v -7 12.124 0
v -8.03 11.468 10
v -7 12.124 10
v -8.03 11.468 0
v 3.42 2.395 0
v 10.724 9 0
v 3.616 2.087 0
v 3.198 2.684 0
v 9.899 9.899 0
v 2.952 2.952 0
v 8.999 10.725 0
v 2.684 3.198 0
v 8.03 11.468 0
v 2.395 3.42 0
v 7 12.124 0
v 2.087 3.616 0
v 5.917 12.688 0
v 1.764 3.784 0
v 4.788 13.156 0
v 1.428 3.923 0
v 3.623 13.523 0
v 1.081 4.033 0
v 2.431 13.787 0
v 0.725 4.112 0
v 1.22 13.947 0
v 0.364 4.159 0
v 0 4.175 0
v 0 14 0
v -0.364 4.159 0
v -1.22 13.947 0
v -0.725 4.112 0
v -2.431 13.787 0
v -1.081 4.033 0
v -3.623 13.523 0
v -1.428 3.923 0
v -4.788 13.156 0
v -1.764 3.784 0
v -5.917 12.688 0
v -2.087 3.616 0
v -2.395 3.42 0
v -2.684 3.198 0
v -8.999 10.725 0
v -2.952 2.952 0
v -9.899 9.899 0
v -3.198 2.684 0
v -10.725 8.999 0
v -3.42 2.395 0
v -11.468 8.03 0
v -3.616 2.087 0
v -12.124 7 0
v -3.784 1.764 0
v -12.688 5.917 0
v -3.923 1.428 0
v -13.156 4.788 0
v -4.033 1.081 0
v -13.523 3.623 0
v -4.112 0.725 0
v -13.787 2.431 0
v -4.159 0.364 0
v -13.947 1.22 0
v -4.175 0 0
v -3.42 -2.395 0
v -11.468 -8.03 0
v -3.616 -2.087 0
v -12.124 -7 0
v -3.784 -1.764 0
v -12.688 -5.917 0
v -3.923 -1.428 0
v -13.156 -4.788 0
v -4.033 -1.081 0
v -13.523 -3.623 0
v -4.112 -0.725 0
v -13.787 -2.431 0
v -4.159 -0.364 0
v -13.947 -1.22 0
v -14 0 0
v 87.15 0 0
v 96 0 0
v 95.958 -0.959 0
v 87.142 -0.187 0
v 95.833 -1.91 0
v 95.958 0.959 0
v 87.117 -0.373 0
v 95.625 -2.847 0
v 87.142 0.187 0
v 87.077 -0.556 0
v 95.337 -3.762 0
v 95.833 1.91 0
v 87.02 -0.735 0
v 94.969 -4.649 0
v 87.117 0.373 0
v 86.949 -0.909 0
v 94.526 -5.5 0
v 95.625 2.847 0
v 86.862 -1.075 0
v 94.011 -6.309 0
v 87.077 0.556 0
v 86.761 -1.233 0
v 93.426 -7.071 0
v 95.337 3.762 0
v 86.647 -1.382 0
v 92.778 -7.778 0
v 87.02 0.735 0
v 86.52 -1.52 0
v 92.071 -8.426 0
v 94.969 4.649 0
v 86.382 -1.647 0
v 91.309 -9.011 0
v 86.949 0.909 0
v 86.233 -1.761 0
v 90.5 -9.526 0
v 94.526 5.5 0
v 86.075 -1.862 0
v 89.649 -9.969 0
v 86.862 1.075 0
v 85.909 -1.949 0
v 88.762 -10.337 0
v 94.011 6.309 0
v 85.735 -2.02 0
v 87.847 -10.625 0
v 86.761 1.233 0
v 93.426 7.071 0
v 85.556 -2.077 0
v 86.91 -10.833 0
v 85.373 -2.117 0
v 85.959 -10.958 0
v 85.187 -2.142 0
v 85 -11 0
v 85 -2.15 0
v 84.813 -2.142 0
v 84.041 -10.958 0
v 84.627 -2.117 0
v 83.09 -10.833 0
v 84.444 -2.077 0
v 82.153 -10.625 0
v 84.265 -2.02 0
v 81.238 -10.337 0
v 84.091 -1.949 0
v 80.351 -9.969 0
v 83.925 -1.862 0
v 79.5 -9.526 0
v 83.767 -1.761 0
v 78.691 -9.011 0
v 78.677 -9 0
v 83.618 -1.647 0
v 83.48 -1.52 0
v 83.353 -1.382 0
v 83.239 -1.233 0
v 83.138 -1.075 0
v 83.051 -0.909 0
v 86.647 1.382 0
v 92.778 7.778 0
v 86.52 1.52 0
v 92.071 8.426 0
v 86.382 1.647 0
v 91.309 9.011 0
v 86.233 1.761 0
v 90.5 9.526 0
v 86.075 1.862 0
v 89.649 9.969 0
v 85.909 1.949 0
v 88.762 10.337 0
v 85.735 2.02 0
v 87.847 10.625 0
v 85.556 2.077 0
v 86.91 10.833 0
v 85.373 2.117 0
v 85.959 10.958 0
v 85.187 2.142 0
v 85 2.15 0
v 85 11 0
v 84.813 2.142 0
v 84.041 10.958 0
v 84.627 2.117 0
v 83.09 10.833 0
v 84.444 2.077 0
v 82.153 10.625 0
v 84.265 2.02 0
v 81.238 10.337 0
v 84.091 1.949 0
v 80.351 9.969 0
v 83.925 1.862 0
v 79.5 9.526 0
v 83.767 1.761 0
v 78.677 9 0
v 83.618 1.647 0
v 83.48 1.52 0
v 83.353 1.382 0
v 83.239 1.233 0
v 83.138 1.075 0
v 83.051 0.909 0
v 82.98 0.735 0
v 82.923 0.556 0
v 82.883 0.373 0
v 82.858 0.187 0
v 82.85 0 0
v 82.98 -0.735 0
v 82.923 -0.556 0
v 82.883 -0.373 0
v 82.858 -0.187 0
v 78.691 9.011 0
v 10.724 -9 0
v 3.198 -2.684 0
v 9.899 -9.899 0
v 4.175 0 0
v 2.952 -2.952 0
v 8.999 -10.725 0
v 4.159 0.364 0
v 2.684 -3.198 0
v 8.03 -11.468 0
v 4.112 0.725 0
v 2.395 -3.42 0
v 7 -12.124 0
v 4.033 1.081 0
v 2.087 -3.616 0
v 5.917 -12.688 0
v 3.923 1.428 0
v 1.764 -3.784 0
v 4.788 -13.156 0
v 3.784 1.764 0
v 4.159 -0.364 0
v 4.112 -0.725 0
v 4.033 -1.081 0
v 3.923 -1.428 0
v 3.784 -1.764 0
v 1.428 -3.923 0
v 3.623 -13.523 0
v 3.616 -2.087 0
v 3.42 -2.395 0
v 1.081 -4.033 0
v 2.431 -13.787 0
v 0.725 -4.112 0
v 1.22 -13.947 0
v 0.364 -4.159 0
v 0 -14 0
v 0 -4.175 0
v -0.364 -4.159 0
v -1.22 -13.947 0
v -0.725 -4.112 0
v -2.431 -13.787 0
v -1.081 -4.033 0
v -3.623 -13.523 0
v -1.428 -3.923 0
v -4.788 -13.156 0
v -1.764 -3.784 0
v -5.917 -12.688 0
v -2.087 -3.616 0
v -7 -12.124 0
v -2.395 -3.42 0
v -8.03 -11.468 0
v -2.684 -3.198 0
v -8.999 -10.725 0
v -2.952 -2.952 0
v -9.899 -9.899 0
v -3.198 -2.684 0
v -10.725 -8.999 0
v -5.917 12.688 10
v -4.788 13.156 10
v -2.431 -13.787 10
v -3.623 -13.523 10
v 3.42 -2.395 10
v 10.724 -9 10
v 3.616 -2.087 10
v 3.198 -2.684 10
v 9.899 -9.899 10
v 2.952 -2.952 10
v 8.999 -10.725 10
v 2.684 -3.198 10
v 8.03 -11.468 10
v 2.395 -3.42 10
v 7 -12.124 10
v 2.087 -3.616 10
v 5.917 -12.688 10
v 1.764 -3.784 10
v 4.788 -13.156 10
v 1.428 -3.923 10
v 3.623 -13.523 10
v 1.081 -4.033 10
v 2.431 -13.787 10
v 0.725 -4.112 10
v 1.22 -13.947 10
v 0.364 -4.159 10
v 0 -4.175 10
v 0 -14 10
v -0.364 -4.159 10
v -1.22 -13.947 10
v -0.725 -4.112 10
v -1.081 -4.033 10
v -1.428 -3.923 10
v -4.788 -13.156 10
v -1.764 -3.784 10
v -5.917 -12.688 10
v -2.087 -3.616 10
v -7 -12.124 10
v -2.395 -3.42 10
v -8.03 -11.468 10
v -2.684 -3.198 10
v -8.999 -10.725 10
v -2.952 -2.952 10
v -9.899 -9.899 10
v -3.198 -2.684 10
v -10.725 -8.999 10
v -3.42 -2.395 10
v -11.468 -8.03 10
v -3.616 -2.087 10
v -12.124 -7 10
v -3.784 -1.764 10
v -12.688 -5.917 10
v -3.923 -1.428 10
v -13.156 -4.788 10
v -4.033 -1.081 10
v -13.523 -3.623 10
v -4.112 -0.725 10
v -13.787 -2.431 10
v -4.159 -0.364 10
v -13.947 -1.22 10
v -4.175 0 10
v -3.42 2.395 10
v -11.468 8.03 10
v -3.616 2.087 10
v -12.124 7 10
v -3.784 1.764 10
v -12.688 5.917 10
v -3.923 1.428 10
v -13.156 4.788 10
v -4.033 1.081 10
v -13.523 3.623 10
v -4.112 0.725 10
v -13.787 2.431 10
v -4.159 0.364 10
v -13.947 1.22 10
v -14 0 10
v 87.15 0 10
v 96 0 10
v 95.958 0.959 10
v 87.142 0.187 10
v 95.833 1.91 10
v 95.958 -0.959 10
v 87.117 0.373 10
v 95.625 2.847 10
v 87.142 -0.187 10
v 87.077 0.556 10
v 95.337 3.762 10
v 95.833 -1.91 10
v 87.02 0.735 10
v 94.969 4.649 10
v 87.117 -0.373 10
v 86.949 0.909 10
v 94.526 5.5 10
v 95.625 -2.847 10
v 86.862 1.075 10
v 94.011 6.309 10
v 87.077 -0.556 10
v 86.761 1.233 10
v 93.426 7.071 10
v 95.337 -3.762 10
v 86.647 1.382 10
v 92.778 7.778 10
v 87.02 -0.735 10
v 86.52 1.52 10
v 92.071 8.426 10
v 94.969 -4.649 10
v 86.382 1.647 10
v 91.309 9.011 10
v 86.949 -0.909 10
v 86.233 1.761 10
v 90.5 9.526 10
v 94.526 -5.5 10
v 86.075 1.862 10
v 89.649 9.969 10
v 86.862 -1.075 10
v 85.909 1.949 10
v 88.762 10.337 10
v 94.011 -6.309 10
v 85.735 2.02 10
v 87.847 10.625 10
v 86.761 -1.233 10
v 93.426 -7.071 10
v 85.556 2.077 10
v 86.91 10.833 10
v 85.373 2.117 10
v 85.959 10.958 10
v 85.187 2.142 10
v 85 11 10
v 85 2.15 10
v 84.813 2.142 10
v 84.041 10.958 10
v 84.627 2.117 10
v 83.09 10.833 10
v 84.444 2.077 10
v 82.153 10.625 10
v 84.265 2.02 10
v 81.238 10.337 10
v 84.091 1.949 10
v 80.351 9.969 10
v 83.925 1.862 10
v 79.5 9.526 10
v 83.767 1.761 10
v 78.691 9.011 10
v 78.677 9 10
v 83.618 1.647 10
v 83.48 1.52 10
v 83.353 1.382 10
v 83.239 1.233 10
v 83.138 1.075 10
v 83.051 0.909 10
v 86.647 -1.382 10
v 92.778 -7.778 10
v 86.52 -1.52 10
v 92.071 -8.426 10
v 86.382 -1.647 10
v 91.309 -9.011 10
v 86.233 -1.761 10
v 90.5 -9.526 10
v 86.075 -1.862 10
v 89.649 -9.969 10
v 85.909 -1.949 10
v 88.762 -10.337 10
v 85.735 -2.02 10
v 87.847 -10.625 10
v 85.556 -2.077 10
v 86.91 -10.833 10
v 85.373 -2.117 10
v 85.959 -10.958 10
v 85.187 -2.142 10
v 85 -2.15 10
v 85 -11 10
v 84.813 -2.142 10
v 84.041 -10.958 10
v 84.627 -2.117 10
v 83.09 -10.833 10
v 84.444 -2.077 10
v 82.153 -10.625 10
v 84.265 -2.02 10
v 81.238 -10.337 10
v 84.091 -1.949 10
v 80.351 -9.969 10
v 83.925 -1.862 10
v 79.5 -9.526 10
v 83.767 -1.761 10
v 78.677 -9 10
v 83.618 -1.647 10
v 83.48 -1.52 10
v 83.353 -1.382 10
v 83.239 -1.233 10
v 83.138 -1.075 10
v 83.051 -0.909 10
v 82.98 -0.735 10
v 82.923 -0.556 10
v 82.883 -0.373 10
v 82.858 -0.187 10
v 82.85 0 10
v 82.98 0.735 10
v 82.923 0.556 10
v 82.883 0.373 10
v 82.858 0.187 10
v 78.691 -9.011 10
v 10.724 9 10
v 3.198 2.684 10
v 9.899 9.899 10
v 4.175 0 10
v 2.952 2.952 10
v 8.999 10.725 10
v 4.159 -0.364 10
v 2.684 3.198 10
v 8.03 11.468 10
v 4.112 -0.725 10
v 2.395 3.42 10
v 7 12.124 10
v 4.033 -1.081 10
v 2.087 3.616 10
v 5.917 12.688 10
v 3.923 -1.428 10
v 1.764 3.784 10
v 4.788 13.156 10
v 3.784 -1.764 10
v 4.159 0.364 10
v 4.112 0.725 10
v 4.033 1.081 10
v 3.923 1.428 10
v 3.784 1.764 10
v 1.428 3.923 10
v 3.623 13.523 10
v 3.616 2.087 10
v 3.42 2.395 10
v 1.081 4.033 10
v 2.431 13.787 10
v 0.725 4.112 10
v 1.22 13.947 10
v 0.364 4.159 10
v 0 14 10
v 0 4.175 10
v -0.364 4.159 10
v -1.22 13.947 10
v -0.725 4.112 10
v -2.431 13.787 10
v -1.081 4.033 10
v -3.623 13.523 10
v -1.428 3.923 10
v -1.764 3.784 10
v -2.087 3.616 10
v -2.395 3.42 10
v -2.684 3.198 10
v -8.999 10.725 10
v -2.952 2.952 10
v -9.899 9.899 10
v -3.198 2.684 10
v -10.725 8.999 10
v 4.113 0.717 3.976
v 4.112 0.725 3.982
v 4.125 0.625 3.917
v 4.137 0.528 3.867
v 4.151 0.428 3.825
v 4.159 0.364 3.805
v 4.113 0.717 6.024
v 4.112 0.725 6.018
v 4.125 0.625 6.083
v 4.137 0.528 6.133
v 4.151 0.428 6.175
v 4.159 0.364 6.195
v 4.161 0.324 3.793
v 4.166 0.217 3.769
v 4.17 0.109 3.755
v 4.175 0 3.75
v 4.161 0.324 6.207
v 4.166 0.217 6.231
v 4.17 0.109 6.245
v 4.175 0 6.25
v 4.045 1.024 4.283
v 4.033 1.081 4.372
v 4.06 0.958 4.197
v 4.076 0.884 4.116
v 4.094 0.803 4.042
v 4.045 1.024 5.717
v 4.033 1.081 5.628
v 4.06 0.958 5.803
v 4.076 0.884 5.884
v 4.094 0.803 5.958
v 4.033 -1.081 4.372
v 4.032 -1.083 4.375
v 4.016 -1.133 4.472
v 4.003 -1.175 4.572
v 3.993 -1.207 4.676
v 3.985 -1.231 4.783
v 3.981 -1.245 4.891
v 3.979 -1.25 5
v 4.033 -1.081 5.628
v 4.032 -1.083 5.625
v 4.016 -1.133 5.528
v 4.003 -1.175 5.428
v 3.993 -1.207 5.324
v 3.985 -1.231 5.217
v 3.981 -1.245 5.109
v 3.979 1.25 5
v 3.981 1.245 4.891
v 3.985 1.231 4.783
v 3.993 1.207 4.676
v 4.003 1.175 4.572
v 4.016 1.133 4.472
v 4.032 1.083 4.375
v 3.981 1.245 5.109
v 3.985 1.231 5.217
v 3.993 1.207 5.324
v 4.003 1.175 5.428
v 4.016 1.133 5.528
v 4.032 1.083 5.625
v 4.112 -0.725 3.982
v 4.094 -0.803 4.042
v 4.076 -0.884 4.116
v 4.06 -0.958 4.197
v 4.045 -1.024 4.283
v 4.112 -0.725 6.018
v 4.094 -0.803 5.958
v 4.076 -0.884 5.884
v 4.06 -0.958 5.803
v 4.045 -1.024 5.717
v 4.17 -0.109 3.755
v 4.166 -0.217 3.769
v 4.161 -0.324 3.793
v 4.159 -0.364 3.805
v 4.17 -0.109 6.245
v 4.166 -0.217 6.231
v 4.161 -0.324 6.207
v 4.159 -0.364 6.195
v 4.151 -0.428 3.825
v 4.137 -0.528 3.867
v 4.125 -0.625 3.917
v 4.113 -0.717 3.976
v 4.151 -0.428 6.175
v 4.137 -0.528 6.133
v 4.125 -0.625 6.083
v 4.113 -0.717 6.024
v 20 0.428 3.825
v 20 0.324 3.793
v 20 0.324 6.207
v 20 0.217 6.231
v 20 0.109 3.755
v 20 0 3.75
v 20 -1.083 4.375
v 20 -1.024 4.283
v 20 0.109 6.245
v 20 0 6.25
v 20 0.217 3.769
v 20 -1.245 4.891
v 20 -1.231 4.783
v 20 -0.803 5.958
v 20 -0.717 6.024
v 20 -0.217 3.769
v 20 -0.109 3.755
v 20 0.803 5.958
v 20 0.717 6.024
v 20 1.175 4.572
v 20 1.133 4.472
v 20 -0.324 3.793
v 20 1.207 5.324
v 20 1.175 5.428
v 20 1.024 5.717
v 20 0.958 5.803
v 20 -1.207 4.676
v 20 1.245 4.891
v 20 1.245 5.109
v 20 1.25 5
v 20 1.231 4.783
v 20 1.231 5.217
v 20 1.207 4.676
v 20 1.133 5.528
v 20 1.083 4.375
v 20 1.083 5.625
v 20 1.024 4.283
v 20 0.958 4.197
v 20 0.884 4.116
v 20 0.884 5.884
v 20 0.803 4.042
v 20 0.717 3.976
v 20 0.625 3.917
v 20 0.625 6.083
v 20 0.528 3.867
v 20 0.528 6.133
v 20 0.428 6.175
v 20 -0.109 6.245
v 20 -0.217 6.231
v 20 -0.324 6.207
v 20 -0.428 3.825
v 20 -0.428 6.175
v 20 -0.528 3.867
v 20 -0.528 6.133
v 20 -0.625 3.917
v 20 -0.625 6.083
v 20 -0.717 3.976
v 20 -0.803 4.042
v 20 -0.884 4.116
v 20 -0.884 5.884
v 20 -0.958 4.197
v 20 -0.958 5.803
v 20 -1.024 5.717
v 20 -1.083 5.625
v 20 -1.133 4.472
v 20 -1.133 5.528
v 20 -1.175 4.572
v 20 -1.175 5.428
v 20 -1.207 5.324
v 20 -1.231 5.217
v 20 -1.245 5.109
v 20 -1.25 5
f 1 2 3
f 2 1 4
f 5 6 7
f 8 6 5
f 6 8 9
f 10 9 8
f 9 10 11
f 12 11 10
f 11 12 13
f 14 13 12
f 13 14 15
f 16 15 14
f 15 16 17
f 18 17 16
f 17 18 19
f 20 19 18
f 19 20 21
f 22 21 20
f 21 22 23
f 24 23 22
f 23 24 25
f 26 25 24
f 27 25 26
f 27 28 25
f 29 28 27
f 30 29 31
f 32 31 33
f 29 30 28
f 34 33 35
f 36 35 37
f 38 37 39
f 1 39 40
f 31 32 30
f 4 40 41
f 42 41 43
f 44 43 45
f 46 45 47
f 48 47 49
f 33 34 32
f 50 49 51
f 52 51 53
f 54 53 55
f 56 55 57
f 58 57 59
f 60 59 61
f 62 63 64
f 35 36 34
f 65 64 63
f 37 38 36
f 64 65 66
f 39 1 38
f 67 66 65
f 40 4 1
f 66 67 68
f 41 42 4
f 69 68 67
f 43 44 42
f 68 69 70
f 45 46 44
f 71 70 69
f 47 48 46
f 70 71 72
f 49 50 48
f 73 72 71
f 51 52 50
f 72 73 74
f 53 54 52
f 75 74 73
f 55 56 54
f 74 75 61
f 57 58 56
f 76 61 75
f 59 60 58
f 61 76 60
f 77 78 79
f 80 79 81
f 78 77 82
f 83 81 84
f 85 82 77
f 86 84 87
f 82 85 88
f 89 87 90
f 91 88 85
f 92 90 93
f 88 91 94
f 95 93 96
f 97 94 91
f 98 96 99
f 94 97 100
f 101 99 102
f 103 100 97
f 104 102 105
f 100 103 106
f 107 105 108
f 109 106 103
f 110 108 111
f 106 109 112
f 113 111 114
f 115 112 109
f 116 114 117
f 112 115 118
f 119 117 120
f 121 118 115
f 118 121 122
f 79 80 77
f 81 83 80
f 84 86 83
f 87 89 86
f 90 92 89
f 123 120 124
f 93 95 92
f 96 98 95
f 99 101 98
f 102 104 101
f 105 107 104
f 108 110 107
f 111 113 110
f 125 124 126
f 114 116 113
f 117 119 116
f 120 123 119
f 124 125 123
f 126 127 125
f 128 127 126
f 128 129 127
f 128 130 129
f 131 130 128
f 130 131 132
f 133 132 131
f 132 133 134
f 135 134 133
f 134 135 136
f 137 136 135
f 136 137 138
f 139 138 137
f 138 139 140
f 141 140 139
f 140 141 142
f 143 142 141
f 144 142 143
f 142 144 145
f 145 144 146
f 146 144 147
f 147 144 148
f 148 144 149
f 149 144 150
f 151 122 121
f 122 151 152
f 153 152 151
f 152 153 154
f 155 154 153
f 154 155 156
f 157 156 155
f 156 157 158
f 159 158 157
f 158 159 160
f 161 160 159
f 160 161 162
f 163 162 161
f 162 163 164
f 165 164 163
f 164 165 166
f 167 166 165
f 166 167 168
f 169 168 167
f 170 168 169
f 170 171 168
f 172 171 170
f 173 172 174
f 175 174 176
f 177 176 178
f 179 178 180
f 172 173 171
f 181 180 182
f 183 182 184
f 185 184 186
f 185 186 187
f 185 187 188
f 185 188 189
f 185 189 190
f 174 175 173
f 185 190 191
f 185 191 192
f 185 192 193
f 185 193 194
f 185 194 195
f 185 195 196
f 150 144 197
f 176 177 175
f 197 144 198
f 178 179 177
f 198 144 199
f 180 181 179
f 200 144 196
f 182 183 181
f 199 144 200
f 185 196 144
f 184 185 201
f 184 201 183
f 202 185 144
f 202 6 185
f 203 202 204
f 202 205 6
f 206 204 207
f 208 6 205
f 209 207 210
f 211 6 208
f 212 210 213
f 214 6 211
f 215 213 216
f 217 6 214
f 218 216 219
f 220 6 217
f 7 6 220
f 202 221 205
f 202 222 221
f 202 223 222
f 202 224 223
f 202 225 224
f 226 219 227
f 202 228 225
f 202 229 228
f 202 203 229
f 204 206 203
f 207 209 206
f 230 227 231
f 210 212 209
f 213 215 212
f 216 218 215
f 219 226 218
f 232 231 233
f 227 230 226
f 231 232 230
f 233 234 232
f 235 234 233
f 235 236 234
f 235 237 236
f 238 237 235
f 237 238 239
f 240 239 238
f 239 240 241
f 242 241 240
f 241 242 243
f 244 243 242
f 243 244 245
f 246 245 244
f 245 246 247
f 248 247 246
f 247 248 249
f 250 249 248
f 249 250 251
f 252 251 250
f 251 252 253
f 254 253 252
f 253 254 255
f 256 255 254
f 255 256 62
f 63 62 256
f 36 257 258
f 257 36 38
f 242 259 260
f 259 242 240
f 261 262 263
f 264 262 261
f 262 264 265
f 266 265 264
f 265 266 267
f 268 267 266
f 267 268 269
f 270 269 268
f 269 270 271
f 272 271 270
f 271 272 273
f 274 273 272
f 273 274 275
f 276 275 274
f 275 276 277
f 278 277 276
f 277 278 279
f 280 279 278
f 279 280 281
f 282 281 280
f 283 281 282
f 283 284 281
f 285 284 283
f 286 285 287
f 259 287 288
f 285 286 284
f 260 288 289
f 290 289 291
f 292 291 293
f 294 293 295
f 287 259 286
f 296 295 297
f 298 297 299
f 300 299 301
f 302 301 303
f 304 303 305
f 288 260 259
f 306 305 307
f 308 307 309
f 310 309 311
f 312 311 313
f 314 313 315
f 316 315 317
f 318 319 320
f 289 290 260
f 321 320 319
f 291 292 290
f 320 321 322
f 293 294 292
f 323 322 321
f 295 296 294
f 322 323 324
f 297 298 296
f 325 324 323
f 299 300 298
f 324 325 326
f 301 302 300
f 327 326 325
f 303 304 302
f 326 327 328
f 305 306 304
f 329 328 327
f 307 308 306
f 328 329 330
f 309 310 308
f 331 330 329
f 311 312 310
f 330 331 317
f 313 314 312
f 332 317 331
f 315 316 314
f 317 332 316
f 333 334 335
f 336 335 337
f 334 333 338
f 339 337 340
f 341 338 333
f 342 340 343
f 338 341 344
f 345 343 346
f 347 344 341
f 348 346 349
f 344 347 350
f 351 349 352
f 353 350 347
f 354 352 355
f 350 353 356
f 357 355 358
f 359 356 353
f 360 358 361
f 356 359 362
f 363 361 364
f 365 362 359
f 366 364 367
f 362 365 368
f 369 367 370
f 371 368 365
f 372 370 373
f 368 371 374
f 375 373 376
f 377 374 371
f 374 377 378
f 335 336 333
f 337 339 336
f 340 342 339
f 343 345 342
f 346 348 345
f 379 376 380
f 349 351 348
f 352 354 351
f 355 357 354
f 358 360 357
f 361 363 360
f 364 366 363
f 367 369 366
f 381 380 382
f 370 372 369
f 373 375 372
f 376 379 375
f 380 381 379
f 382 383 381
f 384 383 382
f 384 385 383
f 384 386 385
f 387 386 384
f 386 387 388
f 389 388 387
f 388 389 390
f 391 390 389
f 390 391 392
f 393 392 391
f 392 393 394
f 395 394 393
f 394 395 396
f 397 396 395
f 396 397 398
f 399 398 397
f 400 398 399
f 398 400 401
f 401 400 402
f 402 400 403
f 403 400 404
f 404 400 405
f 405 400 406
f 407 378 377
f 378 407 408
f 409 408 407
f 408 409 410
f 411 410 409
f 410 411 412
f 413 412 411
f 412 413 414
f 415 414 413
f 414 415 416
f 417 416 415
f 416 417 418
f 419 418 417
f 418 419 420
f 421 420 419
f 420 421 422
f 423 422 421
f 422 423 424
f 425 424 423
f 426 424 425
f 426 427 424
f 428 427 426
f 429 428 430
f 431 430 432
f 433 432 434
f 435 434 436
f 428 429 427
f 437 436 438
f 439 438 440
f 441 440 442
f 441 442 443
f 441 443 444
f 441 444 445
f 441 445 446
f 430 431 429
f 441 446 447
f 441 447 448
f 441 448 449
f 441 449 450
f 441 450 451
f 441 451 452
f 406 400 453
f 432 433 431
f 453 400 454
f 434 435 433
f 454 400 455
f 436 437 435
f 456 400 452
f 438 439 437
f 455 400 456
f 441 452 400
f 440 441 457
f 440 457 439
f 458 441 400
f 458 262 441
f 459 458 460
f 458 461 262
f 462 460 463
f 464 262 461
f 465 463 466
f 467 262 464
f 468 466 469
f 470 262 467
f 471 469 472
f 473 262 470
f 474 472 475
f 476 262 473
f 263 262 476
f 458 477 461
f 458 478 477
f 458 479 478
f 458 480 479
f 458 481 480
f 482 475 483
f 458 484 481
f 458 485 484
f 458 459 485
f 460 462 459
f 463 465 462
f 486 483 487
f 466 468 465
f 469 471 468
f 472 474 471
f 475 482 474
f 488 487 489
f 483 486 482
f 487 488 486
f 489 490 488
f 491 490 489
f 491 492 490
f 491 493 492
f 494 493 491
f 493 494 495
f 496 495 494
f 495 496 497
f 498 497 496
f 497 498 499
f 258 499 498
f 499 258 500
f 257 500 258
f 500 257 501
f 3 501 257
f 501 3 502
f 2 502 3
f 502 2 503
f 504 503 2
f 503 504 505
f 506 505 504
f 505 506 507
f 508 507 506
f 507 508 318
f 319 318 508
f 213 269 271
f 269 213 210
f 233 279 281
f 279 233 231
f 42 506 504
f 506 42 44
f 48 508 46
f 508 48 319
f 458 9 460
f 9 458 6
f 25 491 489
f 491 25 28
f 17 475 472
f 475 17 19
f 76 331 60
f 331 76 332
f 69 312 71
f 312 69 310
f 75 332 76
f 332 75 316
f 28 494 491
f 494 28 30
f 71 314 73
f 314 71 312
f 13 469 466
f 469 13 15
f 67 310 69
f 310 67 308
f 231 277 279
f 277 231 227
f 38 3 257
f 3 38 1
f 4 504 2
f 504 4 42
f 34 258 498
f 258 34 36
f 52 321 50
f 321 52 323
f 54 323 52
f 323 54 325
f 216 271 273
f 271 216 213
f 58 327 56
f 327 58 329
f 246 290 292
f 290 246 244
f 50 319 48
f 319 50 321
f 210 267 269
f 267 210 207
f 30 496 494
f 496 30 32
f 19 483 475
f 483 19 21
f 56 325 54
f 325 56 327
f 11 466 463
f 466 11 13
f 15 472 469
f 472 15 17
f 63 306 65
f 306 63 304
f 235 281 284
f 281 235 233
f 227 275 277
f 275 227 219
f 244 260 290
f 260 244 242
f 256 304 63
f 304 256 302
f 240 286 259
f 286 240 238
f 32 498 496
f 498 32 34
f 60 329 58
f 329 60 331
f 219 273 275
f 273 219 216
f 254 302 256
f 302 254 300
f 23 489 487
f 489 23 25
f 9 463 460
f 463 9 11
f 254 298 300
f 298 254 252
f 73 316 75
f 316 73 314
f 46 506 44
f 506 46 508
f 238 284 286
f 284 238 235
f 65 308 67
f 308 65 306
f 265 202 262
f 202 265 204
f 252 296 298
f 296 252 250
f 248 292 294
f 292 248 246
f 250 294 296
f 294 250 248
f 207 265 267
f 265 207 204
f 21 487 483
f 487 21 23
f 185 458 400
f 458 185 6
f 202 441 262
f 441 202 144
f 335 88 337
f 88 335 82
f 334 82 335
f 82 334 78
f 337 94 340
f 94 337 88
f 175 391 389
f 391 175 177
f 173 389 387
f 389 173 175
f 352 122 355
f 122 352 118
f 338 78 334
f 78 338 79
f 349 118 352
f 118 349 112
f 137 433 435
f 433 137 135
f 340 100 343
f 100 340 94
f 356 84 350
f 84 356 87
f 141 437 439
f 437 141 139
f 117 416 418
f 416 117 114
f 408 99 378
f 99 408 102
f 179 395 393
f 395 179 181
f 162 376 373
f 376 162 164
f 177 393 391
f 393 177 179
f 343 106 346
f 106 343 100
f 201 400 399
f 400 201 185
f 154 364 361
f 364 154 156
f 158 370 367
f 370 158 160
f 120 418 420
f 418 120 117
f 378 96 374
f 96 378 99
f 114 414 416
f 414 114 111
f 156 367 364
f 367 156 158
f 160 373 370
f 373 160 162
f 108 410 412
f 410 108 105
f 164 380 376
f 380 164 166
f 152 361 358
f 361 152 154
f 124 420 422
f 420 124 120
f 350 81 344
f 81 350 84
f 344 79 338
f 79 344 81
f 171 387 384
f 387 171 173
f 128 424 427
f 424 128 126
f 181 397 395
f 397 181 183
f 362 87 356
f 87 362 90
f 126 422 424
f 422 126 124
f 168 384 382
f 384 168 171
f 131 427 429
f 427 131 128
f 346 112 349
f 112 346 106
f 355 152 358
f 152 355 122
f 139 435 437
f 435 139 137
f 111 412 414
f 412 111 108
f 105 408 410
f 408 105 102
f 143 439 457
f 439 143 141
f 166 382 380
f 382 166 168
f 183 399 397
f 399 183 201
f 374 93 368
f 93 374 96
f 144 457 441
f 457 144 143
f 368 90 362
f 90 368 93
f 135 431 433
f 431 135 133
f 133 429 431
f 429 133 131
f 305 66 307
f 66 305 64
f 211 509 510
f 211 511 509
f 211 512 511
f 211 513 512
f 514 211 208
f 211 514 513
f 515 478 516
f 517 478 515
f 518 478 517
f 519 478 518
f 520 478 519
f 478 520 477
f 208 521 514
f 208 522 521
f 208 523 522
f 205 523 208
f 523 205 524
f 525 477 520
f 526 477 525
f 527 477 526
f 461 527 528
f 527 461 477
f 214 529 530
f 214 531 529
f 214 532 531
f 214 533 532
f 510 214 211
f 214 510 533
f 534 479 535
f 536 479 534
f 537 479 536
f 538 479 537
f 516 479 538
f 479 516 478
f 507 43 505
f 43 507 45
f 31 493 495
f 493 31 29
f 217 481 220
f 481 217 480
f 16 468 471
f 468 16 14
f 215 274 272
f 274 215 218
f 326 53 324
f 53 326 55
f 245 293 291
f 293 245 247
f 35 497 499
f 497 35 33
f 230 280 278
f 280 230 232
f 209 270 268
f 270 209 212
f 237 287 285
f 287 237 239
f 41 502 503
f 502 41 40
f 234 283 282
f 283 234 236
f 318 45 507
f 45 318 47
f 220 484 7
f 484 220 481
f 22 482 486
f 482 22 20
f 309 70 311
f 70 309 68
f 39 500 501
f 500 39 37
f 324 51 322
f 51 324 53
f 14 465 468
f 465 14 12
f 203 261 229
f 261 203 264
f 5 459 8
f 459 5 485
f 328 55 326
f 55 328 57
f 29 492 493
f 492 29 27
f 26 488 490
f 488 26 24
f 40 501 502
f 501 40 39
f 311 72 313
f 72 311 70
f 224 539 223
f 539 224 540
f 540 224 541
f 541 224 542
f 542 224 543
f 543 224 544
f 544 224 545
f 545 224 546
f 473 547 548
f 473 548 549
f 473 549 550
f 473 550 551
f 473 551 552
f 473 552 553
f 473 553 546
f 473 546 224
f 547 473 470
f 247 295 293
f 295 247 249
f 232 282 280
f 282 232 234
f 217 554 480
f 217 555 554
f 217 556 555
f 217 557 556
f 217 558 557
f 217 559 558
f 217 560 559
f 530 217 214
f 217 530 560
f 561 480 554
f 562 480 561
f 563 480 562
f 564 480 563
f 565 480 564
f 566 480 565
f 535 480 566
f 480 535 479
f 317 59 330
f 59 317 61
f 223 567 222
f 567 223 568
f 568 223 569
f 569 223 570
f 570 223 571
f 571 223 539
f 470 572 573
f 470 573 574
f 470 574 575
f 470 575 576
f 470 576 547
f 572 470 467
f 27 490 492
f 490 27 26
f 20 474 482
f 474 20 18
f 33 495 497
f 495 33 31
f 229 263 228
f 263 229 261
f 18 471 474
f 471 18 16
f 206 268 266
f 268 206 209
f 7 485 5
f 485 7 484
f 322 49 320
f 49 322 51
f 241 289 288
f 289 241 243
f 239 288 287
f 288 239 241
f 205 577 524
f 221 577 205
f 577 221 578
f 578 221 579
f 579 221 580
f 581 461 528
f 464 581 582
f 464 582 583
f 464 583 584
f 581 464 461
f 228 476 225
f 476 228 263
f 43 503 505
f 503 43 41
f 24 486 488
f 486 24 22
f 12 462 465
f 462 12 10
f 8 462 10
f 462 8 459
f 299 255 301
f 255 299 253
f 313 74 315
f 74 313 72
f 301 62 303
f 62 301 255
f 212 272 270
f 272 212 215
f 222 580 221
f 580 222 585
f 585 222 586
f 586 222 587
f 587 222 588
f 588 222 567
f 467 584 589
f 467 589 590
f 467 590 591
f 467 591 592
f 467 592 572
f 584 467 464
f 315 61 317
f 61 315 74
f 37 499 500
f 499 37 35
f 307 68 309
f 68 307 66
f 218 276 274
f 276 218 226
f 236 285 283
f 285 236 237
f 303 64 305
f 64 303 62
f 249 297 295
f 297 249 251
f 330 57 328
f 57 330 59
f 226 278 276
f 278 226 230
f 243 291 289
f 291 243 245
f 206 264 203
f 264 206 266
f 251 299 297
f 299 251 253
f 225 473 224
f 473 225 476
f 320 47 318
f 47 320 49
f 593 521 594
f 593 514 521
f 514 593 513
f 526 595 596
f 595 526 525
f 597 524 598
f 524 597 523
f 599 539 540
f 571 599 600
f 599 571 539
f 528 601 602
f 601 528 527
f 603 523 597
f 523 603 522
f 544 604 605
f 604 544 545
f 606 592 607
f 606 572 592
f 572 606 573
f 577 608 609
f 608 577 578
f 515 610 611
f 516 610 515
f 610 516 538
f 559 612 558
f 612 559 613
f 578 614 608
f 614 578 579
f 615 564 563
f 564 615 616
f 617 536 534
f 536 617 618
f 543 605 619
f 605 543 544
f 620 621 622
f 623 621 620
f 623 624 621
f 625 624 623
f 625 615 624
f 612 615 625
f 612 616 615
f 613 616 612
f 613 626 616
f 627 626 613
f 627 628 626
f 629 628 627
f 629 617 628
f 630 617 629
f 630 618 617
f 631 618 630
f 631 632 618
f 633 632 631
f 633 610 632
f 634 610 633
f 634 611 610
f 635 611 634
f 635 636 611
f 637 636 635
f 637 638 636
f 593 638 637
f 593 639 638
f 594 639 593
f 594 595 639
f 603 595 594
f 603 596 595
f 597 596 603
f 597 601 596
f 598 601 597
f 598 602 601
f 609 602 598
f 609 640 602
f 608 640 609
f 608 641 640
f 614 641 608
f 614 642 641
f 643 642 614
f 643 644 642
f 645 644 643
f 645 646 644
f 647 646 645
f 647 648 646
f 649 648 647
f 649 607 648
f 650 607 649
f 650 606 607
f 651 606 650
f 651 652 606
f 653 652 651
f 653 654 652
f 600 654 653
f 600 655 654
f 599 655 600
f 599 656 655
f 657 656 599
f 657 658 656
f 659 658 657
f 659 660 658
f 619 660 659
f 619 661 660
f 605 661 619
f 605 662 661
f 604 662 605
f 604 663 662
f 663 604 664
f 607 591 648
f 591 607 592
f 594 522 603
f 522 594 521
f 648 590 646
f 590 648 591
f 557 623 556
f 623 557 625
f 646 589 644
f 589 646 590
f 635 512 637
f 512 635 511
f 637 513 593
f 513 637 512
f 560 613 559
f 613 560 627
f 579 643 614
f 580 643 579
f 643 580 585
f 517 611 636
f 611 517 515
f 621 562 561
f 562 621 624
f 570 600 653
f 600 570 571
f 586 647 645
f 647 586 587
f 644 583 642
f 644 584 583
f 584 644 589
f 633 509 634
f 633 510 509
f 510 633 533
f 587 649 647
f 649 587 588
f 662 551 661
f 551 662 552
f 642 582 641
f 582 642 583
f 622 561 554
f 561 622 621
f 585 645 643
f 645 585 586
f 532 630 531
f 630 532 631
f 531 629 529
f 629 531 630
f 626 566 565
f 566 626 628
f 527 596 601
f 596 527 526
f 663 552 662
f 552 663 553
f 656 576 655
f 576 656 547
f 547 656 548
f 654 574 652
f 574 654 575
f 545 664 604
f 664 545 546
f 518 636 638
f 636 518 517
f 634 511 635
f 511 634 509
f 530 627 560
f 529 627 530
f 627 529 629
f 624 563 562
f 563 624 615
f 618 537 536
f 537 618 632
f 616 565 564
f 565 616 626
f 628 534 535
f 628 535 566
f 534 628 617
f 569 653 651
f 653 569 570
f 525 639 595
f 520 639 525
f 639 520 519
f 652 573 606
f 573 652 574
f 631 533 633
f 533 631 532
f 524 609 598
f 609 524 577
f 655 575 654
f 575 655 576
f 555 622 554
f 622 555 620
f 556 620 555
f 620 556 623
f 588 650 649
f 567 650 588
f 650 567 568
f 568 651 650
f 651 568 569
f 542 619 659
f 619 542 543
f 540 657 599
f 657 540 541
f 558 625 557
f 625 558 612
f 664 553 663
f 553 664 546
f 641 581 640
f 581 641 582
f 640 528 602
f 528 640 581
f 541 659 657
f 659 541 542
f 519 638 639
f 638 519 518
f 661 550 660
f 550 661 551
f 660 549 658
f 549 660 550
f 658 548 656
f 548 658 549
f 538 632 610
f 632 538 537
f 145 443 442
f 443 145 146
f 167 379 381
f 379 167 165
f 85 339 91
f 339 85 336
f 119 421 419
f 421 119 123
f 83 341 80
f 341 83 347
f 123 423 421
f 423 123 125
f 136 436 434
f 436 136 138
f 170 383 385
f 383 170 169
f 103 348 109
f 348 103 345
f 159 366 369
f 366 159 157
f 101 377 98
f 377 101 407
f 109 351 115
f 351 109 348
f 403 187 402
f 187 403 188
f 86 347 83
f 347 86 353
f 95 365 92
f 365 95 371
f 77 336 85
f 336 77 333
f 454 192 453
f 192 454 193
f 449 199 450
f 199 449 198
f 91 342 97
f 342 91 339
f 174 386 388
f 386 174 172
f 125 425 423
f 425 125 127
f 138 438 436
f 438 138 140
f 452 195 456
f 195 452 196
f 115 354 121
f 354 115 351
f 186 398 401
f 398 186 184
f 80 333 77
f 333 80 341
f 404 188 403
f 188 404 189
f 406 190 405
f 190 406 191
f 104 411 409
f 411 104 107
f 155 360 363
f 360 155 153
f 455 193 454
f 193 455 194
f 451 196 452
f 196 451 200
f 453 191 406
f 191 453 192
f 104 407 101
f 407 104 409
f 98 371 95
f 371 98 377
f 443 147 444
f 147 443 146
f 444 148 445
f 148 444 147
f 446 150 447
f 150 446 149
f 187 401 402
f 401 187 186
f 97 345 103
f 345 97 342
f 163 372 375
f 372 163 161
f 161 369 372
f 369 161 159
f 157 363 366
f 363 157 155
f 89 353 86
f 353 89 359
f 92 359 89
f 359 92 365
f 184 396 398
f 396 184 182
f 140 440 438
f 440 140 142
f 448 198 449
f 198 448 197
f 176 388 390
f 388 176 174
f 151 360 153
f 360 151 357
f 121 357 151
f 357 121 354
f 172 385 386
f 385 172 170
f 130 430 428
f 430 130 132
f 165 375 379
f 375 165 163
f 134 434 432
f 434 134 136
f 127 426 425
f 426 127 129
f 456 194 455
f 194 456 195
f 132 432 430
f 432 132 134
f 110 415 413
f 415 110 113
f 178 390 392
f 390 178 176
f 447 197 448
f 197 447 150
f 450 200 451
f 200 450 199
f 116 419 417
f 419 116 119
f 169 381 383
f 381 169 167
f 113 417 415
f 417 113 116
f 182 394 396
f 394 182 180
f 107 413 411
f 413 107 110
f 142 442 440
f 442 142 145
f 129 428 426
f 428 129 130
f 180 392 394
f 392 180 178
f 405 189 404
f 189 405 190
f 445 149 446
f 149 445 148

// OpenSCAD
// file: parameters.scad
// AFPM-Desk-v2 shared parameters (mm)
// Dual-rotor axial-flux PM learning generator with steel back-iron.
// Faraday induction education only — not free-energy / overunity.
// Target printer: Anycubic Kobra 3 Max, 0.4 mm nozzle, 0.2 mm layers, PLA/PETG.

$fn = 72;

// --- Printer / FDM assumptions ---
nozzle = 0.4;
layer = 0.2;
wall = 1.6;                 // load-bearing walls ~4 perimeters
housing_wall = 2.4;
clearance_slip = 0.35;      // shaft slip fit
clearance_loose = 0.55;
press_interference = 0.15;  // bearing pocket undersize total (coupon-test)
magnet_pocket_xy = 0.25;    // +0.25 mm on diameter
magnet_pocket_z = 0.15;     // +0.15 mm depth
elephant_foot = 0.5;

// --- Magnets (N42 Neo discs) ---
magnet_d = 20;
magnet_h = 3;
magnet_count = 8;           // per rotor (8+8 total)
magnet_pcd = 70;

// --- Steel back-iron (purchased mild steel disc) ---
steel_od = 100;
steel_id = 14;              // clearance around hub boss
steel_h = 1.5;              // 1.5–2.0 mm mild steel OK
steel_recess_clearance = 0.3;

// --- Rotor printed disc ---
rotor_od = 110;
rotor_hub_bore = 12;        // seats on shaft_hub boss
rotor_thickness = 7;        // magnet pocket from face; steel recess on back
magnet_pocket_depth = magnet_h + magnet_pocket_z;
steel_recess_depth = steel_h + 0.2;

// --- Stator (coreless, between rotors) ---
stator_od = 120;
stator_id = 28;
stator_thickness = 10;
coil_count = 6;
coil_slot_w = 24;
coil_slot_l = 30;           // radial length of pocket
coil_slot_depth = 8;
coil_pcd = 70;
stator_pillar_pcd = 100;    // M4 pillar holes

// --- Coil former / bobbin ---
former_core_w = 14;
former_core_l = 26;
former_flange = 3;
former_wind_h = 11;
former_bore = 0;            // solid core, split design via kerf

// --- Shaft / bearings ---
shaft_d = 8;
bearing_od = 22;            // 608-2RS
bearing_id = 8;
bearing_h = 7;
bearing_seat_od = bearing_od - press_interference; // coupon-test; start ~21.85

// --- Base / frame ---
base_w = 180;
base_d = 160;
base_h = 8;
post_h = 70;
post_spacing = 120;         // Y distance between bearing post centers
post_d = 36;

// --- Axial stack targets (along shaft / Y) ---
// crank | brg | hub+rotorA+steel | air | stator | air | steel+rotorB+hub | brg
air_gap_nominal = 2.0;      // mechanical per side magnet↔coil face

// --- Crank ---
crank_arm_len = 85;
crank_arm_w = 18;
crank_arm_t = 10;
handle_d = 14;
handle_len = 45;

// --- Electronics tray ---
tray_w = 75;
tray_d = 55;
tray_h = 14;

// --- Fasteners ---
m3_clear = 3.4;
m3_tap = 2.5;
m4_clear = 4.3;
// main file
include <parameters.scad>

module hand_crank() {
  difference() {
    union() {
      // hub
      cylinder(h=crank_arm_t, d=28);
      // arm
      translate([0, -crank_arm_w/2, 0])
        cube([crank_arm_len, crank_arm_w, crank_arm_t]);
      // handle boss
      translate([crank_arm_len, 0, 0])
        cylinder(h=crank_arm_t, d=22);
    }
    // shaft bore
    translate([0,0,-0.1])
      cylinder(h=crank_arm_t+0.2, d=shaft_d + clearance_slip);
    // M3 set screw
    translate([0,0,crank_arm_t/2])
      rotate([0,90,0])
        cylinder(h=20, d=m3_tap);
    // handle pin hole (M4 or printed pin)
    translate([crank_arm_len, 0, -0.1])
      cylinder(h=crank_arm_t+0.2, d=m4_clear);
  }
}

hand_crank();
